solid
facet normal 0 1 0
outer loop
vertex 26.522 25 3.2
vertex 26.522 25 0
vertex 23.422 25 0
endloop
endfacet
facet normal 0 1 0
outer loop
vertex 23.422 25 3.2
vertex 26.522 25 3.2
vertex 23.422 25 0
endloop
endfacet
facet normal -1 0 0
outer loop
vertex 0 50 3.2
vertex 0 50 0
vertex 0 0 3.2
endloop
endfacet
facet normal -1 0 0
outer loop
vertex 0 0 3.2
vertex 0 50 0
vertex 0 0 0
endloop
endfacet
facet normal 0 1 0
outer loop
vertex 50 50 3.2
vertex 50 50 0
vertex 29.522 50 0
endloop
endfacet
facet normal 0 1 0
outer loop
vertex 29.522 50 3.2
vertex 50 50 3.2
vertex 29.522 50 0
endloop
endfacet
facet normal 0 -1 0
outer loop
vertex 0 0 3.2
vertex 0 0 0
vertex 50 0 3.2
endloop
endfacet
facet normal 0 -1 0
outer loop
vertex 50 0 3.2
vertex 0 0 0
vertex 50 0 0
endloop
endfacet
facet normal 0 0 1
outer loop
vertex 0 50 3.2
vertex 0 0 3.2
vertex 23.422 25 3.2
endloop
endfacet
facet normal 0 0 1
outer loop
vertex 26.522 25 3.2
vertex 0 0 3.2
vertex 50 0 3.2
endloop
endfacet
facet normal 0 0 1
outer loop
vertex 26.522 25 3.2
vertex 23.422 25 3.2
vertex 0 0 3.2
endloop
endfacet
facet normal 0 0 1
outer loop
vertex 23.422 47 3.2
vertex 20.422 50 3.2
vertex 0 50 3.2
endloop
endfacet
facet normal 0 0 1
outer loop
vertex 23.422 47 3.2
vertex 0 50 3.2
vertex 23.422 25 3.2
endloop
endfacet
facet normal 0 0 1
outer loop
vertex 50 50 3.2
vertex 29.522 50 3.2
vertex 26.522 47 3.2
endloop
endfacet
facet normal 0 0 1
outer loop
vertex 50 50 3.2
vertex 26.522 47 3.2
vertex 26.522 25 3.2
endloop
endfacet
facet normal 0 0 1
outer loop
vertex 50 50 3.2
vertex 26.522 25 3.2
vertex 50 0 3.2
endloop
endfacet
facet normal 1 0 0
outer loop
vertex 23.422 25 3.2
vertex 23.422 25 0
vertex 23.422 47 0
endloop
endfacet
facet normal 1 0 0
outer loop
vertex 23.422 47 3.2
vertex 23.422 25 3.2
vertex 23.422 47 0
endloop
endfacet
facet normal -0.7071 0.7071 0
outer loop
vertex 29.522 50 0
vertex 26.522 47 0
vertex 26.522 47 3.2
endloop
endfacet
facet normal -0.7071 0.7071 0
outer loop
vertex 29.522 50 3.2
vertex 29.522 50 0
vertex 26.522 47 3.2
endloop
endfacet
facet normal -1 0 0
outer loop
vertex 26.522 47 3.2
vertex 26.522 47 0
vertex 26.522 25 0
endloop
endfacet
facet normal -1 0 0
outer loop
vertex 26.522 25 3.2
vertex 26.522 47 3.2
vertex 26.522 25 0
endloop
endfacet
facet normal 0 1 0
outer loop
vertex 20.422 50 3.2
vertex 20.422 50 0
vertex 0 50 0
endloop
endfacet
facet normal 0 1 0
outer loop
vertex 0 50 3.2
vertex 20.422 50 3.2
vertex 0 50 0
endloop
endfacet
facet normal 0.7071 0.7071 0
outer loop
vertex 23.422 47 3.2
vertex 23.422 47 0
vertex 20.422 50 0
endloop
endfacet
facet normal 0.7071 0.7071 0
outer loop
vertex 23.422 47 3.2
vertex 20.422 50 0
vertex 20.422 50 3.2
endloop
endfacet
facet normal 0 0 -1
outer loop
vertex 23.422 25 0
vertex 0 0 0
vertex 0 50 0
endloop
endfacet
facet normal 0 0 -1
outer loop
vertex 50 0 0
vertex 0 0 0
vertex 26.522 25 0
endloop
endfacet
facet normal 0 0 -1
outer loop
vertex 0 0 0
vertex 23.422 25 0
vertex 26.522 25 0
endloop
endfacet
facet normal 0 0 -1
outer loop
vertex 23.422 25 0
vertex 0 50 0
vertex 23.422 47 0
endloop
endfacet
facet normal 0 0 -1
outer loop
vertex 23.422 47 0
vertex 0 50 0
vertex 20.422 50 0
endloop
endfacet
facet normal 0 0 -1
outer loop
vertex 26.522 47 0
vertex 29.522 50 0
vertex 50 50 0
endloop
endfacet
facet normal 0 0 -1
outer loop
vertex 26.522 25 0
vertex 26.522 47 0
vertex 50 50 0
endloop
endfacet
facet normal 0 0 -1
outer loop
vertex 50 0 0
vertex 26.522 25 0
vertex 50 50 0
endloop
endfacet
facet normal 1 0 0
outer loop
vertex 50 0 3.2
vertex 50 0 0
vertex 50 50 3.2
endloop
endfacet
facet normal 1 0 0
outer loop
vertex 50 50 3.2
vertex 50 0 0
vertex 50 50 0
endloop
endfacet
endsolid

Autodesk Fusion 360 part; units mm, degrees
sketch "Sketch1" plane through (0, 0, 0) normal (0, 0, 1) x (1, 0, 0)
  line L0 (0, 0) -> (50, 0)
  line L1 (50, 0) -> (50, 50)
  line L2 (50, 50) -> (0, 50)
  line L3 (0, 50) -> (0, 0)
  line L4 (25, 59.9444) -> (25, -10) construction
  line L5 (-9.9209, 25) -> (60, 25) construction
  line L6 (23.4218, 51.9444) -> (26.5218, 51.9444)
  line L7 (26.5218, 51.9444) -> (26.5218, 25)
  line L8 (26.5218, 25) -> (23.4218, 25)
  line L9 (23.4218, 25) -> (23.4218, 51.9444)
  dimension "d4" = 3.1
extrude "Extrude1" add sketch "Sketch1" along normal blind 3.2 contours L0 L1 L2 L3 L7 L8 L9
chamfer "Chamfer1" distance 3 angle 45 2 edges at (26.5218, 50, 1.6) (23.4218, 50, 1.6)
equation "material_thickness = 3.2 mm" comment "Real measured thickness of my plywood"
equation "laser_kerf = 0.1 mm" comment "Extra material removed for a given setting"
equation "chamfer_amount = 3 mm" comment "How much to round off each slot"
equation "d4 = material_thickness - laser_kerf"
equation "d5 = material_thickness"
equation "d7 = chamfer_amount"
